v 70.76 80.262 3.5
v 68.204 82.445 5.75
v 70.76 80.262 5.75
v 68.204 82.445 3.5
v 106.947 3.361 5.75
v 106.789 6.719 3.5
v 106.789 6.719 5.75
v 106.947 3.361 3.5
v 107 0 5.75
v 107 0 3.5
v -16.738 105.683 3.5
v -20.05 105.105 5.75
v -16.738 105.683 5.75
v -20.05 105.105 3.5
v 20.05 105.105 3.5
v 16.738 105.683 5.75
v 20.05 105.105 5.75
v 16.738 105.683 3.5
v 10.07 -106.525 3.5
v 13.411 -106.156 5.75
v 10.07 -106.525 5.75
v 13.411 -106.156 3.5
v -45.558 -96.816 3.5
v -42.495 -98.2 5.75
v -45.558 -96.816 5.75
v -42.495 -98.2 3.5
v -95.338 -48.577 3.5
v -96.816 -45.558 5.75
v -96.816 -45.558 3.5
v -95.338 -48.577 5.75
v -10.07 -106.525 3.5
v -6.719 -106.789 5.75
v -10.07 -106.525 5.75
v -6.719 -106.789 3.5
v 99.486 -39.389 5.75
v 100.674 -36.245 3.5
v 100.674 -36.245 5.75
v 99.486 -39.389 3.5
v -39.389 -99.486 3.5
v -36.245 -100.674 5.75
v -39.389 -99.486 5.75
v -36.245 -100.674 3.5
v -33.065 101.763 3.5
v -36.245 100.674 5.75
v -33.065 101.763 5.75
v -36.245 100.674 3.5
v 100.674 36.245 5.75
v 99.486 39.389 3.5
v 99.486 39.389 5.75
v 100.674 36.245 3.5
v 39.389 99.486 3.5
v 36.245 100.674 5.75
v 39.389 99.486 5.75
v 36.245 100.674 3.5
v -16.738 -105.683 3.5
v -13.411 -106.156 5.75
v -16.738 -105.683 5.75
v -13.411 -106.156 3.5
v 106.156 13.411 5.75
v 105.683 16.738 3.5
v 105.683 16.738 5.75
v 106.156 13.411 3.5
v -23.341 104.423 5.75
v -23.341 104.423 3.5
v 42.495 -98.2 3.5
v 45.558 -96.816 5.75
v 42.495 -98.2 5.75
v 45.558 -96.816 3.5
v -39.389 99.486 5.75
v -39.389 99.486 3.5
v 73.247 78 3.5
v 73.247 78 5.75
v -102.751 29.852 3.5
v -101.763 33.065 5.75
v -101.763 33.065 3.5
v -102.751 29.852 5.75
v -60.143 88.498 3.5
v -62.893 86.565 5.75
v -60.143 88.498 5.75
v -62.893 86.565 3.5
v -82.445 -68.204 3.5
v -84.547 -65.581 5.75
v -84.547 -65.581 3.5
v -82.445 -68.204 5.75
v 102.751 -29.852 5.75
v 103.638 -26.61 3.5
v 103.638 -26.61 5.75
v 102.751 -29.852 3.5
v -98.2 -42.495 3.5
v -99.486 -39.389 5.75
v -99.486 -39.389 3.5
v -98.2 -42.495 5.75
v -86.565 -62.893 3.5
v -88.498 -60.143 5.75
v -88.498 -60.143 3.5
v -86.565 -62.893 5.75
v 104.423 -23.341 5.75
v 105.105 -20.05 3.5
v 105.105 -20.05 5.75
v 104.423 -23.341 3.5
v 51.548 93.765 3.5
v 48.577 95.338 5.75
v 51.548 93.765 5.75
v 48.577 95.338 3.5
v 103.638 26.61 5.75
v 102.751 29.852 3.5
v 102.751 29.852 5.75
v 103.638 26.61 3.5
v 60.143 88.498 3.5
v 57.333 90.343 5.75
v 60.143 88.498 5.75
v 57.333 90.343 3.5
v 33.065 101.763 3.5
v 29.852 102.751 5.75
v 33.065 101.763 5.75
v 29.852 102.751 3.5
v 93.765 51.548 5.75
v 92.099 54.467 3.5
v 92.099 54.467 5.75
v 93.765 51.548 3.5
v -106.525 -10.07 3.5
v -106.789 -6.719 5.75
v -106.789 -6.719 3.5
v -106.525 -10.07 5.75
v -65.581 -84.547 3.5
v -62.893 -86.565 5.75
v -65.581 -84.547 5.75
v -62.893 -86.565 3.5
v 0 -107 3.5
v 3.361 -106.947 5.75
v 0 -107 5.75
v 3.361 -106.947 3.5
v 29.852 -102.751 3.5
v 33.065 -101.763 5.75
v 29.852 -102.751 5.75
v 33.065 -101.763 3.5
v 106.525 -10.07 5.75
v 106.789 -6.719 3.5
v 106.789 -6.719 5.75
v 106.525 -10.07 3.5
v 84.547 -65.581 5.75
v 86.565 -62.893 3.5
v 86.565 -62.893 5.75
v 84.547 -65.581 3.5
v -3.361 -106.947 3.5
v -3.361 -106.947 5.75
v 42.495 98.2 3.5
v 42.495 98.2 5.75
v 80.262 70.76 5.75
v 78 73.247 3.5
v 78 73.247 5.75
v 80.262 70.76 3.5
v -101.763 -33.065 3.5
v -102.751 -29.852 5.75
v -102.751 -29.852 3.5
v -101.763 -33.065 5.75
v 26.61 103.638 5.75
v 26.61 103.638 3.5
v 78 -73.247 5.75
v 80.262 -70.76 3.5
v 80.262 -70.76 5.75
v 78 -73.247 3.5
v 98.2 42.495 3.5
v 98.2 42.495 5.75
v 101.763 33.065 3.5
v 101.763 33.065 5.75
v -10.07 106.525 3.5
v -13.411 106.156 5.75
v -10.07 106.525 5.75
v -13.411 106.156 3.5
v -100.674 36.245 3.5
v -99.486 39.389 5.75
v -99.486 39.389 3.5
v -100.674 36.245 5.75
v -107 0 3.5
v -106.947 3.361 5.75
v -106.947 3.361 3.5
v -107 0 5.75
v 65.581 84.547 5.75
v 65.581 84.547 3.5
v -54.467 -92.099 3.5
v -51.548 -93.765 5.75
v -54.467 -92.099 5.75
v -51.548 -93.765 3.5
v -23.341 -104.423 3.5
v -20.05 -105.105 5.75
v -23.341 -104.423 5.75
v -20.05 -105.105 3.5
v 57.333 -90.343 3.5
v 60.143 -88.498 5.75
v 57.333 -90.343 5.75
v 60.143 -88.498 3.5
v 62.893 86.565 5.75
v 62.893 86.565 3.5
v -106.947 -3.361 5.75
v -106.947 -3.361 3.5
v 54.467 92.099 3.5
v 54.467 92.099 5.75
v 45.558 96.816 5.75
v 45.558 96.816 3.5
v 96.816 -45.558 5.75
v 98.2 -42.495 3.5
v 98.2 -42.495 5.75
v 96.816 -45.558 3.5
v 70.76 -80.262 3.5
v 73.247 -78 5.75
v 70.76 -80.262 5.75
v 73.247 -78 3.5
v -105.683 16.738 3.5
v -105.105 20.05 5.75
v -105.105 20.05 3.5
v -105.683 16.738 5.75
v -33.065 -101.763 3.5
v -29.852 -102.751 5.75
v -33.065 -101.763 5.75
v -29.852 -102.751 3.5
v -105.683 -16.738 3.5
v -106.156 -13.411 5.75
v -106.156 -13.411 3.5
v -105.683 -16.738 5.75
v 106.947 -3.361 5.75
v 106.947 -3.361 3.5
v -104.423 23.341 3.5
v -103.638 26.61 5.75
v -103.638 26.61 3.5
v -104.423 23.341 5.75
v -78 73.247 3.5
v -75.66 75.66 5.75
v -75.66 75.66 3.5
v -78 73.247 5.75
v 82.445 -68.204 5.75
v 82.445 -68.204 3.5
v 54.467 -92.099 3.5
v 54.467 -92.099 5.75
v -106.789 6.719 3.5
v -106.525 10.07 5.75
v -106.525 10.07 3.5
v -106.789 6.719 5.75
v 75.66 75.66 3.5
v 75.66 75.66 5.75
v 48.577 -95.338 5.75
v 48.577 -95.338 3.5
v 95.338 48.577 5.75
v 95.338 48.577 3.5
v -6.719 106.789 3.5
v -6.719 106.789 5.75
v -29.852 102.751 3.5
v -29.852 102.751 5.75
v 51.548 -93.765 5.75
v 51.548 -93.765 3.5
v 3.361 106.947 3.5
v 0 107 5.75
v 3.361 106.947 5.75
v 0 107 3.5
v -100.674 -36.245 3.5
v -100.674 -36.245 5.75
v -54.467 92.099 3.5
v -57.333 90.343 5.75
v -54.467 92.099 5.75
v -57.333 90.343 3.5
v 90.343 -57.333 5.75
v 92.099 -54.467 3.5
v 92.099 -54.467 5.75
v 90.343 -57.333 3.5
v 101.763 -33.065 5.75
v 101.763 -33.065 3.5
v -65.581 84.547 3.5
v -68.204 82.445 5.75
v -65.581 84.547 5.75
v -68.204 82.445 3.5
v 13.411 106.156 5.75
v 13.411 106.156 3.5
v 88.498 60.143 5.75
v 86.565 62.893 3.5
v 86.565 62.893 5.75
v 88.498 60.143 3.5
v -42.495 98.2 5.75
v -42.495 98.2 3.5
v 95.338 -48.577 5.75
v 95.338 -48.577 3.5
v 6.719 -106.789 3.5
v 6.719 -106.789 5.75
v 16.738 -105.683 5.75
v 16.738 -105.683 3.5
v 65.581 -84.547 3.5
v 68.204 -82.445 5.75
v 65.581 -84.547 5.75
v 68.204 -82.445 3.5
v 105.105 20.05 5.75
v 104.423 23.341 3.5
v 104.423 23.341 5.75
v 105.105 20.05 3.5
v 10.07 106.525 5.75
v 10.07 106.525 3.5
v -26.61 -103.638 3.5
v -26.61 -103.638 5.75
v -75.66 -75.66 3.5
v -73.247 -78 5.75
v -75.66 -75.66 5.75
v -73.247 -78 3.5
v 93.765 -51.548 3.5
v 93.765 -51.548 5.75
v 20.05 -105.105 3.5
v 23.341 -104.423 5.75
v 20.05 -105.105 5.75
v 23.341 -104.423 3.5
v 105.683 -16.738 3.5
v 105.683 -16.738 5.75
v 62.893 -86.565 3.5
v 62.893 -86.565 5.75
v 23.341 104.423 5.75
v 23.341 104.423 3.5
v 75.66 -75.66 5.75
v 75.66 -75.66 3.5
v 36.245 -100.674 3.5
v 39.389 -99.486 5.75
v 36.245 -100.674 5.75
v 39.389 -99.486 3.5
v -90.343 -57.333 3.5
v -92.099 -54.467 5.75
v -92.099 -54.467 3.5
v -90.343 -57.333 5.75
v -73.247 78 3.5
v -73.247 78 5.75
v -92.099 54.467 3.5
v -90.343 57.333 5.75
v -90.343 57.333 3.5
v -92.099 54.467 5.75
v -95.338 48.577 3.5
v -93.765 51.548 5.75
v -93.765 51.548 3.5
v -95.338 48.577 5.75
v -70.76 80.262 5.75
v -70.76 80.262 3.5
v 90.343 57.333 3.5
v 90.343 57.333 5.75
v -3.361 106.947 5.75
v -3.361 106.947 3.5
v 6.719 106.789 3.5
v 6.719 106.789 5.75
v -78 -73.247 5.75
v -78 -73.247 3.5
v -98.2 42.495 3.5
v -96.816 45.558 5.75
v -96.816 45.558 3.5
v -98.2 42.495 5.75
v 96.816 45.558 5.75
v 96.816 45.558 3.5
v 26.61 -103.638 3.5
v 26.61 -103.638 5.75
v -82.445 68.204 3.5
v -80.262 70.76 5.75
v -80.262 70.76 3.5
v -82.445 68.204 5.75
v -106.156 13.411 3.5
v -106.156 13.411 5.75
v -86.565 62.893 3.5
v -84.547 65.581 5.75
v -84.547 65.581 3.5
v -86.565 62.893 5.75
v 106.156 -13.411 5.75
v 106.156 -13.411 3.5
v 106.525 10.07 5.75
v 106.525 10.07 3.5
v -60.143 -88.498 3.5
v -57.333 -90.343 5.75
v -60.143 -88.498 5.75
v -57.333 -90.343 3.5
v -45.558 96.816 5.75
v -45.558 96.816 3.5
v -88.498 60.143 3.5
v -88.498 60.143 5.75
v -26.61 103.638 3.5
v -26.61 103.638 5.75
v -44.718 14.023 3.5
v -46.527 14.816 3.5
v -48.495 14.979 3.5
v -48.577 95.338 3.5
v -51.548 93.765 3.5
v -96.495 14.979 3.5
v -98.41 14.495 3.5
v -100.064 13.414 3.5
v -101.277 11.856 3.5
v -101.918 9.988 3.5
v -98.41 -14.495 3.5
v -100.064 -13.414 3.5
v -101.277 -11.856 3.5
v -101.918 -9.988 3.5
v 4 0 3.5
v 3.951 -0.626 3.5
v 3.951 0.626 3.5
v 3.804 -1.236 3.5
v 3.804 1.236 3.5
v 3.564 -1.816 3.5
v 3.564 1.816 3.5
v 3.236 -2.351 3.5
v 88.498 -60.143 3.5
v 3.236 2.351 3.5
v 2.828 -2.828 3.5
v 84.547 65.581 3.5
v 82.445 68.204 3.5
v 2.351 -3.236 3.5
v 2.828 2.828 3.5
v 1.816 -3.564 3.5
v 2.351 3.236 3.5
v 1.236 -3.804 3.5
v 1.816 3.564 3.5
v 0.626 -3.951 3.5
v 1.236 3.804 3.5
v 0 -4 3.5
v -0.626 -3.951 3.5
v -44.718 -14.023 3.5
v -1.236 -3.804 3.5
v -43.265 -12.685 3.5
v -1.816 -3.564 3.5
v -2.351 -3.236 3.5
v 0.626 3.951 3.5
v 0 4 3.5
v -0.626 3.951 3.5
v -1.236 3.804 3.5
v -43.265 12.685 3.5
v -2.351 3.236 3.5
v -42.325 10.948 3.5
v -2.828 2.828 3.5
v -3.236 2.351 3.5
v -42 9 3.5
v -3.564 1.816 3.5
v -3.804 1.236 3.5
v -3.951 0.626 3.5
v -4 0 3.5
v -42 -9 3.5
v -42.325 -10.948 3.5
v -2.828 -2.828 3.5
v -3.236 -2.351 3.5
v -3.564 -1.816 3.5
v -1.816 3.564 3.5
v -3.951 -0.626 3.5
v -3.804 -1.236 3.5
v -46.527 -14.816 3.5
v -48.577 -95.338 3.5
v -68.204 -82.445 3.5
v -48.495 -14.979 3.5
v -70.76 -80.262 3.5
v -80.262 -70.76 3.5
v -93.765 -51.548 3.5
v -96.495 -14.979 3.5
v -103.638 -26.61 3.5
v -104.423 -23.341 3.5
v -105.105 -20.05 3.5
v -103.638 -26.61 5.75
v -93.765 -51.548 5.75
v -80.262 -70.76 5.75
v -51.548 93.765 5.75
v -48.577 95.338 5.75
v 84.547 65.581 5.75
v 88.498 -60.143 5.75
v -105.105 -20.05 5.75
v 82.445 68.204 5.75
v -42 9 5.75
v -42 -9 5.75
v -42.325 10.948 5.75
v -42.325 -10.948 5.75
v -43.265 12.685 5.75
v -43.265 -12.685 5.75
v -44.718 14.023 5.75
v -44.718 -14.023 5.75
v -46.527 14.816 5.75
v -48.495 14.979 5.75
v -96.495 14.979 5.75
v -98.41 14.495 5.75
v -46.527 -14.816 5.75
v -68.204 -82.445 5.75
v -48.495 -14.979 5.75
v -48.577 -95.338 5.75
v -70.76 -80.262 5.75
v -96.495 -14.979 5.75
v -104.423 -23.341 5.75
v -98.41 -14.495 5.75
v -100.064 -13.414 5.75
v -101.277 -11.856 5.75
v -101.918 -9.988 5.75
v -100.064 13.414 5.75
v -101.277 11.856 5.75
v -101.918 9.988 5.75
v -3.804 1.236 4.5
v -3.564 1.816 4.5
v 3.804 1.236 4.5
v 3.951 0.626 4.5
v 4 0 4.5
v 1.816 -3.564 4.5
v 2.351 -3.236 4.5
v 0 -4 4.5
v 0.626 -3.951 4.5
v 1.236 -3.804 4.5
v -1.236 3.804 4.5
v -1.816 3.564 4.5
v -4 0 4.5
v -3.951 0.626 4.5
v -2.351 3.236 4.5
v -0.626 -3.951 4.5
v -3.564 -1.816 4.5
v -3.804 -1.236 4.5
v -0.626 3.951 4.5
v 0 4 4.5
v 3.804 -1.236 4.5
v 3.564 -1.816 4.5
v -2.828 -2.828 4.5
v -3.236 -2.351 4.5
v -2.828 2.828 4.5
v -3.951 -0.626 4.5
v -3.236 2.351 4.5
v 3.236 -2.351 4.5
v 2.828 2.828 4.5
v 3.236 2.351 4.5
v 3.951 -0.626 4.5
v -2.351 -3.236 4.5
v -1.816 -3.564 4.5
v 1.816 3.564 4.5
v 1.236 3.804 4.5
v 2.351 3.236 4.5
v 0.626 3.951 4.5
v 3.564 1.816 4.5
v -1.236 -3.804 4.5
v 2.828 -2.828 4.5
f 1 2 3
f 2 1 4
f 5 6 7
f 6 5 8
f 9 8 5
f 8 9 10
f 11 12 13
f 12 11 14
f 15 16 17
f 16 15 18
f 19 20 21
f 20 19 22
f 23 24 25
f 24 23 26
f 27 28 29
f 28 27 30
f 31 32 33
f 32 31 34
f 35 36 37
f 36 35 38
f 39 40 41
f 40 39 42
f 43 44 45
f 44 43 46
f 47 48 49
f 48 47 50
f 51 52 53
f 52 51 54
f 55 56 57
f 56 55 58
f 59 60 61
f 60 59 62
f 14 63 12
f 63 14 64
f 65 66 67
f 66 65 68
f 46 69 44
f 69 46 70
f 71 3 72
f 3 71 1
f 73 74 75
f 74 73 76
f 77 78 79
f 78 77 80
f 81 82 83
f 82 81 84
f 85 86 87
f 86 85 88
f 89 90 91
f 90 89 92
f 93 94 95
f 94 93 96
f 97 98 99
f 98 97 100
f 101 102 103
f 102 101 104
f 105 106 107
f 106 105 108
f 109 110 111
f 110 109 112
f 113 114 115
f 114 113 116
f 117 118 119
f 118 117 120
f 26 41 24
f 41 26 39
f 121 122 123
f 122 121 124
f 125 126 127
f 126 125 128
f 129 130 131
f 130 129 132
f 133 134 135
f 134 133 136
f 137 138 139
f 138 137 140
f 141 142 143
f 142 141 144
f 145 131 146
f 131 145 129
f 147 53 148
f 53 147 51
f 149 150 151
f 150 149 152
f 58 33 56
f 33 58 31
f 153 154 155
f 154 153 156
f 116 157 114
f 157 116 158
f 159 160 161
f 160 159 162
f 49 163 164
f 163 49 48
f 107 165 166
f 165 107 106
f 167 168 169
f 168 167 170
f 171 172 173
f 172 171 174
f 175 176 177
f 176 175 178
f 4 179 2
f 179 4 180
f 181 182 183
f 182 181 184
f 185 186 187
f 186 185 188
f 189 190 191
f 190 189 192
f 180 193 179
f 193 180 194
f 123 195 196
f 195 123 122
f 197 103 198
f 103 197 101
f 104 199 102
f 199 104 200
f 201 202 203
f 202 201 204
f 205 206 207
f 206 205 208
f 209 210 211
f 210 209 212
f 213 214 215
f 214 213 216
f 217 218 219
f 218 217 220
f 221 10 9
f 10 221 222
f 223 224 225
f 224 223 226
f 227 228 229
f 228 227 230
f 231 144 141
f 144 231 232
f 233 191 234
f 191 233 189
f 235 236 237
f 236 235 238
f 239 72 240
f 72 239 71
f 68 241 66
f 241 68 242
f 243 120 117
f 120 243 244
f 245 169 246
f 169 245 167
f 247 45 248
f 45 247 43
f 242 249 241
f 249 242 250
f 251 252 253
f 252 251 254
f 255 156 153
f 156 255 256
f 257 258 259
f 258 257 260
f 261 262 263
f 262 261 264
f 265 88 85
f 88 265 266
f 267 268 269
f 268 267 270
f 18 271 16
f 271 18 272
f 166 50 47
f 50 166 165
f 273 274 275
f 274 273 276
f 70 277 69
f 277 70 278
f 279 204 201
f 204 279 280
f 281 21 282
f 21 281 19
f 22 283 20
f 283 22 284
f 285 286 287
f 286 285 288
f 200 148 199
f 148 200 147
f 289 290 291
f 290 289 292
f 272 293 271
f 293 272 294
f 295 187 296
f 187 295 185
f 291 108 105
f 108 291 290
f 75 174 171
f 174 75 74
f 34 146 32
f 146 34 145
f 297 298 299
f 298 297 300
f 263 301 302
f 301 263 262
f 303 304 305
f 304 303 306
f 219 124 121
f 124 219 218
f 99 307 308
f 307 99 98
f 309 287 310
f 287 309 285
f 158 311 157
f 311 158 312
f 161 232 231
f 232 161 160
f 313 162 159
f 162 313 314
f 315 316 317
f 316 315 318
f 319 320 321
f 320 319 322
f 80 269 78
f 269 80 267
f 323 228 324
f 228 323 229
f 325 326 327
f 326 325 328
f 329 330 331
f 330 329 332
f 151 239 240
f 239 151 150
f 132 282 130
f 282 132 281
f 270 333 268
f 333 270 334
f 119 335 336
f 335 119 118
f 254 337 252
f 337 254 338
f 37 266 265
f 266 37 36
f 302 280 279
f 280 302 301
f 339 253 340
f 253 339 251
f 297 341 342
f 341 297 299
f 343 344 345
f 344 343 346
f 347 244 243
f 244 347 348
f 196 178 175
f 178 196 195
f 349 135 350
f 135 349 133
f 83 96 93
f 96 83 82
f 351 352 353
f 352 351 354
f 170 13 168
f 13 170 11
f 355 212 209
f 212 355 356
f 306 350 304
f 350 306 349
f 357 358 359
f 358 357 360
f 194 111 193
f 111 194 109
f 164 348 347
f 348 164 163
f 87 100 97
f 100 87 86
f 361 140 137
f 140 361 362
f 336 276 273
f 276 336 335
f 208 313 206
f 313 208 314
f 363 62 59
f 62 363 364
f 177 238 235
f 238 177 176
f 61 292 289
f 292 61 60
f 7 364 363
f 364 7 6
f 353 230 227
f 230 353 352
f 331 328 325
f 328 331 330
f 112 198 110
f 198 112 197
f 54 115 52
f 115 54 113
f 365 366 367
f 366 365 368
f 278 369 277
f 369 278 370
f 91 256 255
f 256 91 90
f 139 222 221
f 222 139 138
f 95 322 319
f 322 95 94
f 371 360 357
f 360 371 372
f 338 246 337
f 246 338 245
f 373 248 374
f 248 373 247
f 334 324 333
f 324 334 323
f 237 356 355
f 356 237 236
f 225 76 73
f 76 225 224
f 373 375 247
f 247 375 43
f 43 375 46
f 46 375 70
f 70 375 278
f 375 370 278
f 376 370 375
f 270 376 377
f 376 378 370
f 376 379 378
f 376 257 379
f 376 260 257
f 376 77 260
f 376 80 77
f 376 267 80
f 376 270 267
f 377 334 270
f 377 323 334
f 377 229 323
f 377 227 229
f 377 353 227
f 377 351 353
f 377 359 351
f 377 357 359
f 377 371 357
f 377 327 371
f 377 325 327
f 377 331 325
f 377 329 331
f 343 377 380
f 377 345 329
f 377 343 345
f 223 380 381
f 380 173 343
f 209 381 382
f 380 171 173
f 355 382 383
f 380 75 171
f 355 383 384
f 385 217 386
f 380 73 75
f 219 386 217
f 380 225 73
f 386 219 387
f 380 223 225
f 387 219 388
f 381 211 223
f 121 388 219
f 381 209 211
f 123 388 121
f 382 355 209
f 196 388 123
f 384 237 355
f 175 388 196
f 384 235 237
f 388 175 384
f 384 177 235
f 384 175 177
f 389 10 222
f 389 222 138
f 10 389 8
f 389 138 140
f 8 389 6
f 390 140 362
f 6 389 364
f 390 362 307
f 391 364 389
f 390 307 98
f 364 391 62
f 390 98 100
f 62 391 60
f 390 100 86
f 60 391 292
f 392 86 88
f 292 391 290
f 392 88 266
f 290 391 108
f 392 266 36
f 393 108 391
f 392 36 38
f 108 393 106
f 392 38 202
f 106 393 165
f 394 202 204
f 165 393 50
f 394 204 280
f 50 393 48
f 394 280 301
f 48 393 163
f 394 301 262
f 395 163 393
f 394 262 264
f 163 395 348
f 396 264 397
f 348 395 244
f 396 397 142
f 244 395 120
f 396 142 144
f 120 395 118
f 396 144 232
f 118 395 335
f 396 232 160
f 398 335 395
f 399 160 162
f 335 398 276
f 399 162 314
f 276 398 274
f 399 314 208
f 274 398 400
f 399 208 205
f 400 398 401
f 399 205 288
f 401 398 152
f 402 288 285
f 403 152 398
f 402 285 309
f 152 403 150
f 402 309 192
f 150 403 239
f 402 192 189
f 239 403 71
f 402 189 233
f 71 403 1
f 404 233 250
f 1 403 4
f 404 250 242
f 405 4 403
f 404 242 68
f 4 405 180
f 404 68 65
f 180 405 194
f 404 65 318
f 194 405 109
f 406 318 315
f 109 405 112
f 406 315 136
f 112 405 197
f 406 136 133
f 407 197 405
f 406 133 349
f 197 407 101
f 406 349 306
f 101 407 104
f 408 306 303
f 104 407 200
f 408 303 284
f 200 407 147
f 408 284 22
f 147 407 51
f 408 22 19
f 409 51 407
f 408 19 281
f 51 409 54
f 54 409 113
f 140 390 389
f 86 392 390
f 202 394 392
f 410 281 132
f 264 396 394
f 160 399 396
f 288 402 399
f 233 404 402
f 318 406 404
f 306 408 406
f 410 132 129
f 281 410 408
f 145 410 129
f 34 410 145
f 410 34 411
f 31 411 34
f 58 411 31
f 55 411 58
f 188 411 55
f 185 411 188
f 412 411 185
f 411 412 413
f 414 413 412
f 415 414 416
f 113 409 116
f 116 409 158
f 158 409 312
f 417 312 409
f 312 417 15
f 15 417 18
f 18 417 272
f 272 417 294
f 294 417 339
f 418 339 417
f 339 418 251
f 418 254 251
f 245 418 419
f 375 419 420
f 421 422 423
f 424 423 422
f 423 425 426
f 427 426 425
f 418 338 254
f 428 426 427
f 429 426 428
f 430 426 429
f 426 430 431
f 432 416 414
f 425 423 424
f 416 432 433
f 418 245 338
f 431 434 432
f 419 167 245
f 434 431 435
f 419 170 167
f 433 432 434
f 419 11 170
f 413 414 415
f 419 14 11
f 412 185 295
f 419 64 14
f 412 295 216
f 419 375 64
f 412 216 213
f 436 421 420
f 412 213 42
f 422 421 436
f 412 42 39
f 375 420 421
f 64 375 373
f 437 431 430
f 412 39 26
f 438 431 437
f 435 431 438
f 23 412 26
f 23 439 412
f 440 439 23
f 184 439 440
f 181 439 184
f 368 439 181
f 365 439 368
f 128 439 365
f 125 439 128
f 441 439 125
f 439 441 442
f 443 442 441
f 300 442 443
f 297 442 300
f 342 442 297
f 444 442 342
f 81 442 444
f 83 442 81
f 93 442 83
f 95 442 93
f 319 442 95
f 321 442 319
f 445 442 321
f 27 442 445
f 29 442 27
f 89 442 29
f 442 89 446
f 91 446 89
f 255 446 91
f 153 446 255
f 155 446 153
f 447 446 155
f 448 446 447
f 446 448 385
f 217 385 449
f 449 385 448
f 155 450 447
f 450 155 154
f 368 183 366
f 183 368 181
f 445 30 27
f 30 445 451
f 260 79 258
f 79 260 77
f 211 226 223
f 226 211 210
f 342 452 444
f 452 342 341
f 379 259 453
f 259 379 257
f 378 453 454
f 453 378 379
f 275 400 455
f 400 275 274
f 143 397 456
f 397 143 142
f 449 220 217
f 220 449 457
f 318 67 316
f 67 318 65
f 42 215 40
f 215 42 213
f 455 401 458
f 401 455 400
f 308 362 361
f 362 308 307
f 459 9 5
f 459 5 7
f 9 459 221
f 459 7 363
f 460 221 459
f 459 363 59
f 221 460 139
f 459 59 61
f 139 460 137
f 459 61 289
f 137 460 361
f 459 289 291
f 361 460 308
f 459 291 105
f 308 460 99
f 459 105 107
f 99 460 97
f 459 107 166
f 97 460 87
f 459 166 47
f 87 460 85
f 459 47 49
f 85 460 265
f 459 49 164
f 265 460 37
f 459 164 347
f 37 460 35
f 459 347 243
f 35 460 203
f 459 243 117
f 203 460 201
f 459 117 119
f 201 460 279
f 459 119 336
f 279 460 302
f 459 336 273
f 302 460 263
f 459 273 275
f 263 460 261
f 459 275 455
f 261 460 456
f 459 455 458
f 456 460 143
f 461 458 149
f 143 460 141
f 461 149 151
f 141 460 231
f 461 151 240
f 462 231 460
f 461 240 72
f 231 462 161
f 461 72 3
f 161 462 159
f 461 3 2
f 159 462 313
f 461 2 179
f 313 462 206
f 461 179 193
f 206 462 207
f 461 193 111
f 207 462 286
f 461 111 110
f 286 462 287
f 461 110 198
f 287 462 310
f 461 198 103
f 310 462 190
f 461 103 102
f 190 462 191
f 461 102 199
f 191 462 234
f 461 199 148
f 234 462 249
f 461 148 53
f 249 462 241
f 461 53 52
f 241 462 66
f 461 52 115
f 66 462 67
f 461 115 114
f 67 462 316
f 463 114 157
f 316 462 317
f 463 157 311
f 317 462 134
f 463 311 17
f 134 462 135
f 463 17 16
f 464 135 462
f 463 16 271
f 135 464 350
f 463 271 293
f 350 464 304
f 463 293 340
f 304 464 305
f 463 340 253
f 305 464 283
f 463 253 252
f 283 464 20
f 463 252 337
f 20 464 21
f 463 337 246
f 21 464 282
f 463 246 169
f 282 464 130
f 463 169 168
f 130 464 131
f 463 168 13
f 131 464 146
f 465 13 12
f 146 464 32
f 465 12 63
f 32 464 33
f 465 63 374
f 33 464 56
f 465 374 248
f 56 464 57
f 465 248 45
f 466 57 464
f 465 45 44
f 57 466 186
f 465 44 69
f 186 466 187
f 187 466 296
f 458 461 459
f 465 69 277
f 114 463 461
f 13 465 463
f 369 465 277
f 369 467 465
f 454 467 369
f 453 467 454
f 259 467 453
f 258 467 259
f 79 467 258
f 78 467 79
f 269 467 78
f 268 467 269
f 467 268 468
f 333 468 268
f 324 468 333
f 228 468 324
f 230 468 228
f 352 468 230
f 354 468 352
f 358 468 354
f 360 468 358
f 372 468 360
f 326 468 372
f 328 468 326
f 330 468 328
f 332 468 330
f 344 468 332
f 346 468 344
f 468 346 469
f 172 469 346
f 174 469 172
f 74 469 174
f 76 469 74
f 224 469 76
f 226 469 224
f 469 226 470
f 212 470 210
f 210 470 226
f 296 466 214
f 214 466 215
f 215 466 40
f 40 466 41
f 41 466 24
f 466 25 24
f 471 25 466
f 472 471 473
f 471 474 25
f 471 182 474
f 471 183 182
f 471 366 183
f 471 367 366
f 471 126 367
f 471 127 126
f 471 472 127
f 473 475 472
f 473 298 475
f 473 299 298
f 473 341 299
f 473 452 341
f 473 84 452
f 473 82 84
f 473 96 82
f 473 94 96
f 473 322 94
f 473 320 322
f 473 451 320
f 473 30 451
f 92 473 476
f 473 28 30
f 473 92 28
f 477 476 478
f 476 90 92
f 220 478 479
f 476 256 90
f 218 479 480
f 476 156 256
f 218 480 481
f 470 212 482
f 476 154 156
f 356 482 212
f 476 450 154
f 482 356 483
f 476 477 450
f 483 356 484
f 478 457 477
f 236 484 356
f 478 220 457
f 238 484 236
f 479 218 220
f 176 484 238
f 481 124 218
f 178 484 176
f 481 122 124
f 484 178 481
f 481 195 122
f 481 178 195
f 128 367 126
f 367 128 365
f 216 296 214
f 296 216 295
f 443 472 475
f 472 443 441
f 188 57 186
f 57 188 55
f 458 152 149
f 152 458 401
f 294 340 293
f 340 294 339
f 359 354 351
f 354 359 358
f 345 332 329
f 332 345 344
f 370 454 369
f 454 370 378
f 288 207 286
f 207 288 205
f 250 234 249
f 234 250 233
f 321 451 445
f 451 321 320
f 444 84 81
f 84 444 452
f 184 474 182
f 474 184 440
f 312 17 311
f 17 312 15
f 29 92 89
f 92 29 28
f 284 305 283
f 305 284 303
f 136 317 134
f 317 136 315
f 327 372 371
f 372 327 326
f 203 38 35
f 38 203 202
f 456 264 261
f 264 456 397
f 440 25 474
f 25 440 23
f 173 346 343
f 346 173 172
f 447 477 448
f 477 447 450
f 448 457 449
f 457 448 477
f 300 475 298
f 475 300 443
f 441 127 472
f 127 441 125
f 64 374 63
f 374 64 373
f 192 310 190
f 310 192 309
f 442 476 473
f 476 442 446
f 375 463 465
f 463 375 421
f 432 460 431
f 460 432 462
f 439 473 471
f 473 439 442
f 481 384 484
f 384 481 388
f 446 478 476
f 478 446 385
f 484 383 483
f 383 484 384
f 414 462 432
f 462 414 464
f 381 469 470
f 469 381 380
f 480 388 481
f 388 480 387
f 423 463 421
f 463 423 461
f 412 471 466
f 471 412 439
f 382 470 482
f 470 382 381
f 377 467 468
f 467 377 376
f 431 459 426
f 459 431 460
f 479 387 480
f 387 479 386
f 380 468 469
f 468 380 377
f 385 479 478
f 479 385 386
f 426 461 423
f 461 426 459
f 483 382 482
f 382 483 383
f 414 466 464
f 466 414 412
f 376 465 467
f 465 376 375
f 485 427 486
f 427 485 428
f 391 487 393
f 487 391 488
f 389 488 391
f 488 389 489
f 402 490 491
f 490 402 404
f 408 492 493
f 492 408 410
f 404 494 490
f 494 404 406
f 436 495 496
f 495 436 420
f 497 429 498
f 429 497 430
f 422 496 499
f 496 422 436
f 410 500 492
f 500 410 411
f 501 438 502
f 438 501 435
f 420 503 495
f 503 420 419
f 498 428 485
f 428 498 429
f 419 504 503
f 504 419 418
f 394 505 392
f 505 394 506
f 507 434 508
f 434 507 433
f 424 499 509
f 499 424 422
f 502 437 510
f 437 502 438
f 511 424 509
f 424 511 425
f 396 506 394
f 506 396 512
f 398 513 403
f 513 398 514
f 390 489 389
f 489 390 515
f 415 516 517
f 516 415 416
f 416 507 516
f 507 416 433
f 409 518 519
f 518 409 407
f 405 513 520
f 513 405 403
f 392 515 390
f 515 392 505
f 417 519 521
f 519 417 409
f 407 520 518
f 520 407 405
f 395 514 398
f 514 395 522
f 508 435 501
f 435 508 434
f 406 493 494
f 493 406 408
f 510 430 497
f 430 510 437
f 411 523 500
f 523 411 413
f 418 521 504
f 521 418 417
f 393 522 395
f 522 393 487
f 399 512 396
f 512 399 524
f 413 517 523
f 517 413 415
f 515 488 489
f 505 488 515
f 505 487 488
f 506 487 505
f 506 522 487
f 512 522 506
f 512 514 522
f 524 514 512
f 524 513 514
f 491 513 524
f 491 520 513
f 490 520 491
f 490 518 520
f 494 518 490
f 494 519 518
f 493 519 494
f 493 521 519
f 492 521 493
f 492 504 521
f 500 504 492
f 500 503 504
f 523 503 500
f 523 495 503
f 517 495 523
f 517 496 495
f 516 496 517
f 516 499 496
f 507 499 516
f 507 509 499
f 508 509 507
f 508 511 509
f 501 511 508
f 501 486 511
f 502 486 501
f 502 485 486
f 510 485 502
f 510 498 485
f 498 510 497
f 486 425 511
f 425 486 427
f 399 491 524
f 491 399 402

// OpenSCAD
disable_cover_plate = false;
disable_hours_disc = true;
disable_hours_text = true;
disable_minutes_disc = true;
disable_minutes_text = true;
disable_base = true;

include <../clock.scad>
